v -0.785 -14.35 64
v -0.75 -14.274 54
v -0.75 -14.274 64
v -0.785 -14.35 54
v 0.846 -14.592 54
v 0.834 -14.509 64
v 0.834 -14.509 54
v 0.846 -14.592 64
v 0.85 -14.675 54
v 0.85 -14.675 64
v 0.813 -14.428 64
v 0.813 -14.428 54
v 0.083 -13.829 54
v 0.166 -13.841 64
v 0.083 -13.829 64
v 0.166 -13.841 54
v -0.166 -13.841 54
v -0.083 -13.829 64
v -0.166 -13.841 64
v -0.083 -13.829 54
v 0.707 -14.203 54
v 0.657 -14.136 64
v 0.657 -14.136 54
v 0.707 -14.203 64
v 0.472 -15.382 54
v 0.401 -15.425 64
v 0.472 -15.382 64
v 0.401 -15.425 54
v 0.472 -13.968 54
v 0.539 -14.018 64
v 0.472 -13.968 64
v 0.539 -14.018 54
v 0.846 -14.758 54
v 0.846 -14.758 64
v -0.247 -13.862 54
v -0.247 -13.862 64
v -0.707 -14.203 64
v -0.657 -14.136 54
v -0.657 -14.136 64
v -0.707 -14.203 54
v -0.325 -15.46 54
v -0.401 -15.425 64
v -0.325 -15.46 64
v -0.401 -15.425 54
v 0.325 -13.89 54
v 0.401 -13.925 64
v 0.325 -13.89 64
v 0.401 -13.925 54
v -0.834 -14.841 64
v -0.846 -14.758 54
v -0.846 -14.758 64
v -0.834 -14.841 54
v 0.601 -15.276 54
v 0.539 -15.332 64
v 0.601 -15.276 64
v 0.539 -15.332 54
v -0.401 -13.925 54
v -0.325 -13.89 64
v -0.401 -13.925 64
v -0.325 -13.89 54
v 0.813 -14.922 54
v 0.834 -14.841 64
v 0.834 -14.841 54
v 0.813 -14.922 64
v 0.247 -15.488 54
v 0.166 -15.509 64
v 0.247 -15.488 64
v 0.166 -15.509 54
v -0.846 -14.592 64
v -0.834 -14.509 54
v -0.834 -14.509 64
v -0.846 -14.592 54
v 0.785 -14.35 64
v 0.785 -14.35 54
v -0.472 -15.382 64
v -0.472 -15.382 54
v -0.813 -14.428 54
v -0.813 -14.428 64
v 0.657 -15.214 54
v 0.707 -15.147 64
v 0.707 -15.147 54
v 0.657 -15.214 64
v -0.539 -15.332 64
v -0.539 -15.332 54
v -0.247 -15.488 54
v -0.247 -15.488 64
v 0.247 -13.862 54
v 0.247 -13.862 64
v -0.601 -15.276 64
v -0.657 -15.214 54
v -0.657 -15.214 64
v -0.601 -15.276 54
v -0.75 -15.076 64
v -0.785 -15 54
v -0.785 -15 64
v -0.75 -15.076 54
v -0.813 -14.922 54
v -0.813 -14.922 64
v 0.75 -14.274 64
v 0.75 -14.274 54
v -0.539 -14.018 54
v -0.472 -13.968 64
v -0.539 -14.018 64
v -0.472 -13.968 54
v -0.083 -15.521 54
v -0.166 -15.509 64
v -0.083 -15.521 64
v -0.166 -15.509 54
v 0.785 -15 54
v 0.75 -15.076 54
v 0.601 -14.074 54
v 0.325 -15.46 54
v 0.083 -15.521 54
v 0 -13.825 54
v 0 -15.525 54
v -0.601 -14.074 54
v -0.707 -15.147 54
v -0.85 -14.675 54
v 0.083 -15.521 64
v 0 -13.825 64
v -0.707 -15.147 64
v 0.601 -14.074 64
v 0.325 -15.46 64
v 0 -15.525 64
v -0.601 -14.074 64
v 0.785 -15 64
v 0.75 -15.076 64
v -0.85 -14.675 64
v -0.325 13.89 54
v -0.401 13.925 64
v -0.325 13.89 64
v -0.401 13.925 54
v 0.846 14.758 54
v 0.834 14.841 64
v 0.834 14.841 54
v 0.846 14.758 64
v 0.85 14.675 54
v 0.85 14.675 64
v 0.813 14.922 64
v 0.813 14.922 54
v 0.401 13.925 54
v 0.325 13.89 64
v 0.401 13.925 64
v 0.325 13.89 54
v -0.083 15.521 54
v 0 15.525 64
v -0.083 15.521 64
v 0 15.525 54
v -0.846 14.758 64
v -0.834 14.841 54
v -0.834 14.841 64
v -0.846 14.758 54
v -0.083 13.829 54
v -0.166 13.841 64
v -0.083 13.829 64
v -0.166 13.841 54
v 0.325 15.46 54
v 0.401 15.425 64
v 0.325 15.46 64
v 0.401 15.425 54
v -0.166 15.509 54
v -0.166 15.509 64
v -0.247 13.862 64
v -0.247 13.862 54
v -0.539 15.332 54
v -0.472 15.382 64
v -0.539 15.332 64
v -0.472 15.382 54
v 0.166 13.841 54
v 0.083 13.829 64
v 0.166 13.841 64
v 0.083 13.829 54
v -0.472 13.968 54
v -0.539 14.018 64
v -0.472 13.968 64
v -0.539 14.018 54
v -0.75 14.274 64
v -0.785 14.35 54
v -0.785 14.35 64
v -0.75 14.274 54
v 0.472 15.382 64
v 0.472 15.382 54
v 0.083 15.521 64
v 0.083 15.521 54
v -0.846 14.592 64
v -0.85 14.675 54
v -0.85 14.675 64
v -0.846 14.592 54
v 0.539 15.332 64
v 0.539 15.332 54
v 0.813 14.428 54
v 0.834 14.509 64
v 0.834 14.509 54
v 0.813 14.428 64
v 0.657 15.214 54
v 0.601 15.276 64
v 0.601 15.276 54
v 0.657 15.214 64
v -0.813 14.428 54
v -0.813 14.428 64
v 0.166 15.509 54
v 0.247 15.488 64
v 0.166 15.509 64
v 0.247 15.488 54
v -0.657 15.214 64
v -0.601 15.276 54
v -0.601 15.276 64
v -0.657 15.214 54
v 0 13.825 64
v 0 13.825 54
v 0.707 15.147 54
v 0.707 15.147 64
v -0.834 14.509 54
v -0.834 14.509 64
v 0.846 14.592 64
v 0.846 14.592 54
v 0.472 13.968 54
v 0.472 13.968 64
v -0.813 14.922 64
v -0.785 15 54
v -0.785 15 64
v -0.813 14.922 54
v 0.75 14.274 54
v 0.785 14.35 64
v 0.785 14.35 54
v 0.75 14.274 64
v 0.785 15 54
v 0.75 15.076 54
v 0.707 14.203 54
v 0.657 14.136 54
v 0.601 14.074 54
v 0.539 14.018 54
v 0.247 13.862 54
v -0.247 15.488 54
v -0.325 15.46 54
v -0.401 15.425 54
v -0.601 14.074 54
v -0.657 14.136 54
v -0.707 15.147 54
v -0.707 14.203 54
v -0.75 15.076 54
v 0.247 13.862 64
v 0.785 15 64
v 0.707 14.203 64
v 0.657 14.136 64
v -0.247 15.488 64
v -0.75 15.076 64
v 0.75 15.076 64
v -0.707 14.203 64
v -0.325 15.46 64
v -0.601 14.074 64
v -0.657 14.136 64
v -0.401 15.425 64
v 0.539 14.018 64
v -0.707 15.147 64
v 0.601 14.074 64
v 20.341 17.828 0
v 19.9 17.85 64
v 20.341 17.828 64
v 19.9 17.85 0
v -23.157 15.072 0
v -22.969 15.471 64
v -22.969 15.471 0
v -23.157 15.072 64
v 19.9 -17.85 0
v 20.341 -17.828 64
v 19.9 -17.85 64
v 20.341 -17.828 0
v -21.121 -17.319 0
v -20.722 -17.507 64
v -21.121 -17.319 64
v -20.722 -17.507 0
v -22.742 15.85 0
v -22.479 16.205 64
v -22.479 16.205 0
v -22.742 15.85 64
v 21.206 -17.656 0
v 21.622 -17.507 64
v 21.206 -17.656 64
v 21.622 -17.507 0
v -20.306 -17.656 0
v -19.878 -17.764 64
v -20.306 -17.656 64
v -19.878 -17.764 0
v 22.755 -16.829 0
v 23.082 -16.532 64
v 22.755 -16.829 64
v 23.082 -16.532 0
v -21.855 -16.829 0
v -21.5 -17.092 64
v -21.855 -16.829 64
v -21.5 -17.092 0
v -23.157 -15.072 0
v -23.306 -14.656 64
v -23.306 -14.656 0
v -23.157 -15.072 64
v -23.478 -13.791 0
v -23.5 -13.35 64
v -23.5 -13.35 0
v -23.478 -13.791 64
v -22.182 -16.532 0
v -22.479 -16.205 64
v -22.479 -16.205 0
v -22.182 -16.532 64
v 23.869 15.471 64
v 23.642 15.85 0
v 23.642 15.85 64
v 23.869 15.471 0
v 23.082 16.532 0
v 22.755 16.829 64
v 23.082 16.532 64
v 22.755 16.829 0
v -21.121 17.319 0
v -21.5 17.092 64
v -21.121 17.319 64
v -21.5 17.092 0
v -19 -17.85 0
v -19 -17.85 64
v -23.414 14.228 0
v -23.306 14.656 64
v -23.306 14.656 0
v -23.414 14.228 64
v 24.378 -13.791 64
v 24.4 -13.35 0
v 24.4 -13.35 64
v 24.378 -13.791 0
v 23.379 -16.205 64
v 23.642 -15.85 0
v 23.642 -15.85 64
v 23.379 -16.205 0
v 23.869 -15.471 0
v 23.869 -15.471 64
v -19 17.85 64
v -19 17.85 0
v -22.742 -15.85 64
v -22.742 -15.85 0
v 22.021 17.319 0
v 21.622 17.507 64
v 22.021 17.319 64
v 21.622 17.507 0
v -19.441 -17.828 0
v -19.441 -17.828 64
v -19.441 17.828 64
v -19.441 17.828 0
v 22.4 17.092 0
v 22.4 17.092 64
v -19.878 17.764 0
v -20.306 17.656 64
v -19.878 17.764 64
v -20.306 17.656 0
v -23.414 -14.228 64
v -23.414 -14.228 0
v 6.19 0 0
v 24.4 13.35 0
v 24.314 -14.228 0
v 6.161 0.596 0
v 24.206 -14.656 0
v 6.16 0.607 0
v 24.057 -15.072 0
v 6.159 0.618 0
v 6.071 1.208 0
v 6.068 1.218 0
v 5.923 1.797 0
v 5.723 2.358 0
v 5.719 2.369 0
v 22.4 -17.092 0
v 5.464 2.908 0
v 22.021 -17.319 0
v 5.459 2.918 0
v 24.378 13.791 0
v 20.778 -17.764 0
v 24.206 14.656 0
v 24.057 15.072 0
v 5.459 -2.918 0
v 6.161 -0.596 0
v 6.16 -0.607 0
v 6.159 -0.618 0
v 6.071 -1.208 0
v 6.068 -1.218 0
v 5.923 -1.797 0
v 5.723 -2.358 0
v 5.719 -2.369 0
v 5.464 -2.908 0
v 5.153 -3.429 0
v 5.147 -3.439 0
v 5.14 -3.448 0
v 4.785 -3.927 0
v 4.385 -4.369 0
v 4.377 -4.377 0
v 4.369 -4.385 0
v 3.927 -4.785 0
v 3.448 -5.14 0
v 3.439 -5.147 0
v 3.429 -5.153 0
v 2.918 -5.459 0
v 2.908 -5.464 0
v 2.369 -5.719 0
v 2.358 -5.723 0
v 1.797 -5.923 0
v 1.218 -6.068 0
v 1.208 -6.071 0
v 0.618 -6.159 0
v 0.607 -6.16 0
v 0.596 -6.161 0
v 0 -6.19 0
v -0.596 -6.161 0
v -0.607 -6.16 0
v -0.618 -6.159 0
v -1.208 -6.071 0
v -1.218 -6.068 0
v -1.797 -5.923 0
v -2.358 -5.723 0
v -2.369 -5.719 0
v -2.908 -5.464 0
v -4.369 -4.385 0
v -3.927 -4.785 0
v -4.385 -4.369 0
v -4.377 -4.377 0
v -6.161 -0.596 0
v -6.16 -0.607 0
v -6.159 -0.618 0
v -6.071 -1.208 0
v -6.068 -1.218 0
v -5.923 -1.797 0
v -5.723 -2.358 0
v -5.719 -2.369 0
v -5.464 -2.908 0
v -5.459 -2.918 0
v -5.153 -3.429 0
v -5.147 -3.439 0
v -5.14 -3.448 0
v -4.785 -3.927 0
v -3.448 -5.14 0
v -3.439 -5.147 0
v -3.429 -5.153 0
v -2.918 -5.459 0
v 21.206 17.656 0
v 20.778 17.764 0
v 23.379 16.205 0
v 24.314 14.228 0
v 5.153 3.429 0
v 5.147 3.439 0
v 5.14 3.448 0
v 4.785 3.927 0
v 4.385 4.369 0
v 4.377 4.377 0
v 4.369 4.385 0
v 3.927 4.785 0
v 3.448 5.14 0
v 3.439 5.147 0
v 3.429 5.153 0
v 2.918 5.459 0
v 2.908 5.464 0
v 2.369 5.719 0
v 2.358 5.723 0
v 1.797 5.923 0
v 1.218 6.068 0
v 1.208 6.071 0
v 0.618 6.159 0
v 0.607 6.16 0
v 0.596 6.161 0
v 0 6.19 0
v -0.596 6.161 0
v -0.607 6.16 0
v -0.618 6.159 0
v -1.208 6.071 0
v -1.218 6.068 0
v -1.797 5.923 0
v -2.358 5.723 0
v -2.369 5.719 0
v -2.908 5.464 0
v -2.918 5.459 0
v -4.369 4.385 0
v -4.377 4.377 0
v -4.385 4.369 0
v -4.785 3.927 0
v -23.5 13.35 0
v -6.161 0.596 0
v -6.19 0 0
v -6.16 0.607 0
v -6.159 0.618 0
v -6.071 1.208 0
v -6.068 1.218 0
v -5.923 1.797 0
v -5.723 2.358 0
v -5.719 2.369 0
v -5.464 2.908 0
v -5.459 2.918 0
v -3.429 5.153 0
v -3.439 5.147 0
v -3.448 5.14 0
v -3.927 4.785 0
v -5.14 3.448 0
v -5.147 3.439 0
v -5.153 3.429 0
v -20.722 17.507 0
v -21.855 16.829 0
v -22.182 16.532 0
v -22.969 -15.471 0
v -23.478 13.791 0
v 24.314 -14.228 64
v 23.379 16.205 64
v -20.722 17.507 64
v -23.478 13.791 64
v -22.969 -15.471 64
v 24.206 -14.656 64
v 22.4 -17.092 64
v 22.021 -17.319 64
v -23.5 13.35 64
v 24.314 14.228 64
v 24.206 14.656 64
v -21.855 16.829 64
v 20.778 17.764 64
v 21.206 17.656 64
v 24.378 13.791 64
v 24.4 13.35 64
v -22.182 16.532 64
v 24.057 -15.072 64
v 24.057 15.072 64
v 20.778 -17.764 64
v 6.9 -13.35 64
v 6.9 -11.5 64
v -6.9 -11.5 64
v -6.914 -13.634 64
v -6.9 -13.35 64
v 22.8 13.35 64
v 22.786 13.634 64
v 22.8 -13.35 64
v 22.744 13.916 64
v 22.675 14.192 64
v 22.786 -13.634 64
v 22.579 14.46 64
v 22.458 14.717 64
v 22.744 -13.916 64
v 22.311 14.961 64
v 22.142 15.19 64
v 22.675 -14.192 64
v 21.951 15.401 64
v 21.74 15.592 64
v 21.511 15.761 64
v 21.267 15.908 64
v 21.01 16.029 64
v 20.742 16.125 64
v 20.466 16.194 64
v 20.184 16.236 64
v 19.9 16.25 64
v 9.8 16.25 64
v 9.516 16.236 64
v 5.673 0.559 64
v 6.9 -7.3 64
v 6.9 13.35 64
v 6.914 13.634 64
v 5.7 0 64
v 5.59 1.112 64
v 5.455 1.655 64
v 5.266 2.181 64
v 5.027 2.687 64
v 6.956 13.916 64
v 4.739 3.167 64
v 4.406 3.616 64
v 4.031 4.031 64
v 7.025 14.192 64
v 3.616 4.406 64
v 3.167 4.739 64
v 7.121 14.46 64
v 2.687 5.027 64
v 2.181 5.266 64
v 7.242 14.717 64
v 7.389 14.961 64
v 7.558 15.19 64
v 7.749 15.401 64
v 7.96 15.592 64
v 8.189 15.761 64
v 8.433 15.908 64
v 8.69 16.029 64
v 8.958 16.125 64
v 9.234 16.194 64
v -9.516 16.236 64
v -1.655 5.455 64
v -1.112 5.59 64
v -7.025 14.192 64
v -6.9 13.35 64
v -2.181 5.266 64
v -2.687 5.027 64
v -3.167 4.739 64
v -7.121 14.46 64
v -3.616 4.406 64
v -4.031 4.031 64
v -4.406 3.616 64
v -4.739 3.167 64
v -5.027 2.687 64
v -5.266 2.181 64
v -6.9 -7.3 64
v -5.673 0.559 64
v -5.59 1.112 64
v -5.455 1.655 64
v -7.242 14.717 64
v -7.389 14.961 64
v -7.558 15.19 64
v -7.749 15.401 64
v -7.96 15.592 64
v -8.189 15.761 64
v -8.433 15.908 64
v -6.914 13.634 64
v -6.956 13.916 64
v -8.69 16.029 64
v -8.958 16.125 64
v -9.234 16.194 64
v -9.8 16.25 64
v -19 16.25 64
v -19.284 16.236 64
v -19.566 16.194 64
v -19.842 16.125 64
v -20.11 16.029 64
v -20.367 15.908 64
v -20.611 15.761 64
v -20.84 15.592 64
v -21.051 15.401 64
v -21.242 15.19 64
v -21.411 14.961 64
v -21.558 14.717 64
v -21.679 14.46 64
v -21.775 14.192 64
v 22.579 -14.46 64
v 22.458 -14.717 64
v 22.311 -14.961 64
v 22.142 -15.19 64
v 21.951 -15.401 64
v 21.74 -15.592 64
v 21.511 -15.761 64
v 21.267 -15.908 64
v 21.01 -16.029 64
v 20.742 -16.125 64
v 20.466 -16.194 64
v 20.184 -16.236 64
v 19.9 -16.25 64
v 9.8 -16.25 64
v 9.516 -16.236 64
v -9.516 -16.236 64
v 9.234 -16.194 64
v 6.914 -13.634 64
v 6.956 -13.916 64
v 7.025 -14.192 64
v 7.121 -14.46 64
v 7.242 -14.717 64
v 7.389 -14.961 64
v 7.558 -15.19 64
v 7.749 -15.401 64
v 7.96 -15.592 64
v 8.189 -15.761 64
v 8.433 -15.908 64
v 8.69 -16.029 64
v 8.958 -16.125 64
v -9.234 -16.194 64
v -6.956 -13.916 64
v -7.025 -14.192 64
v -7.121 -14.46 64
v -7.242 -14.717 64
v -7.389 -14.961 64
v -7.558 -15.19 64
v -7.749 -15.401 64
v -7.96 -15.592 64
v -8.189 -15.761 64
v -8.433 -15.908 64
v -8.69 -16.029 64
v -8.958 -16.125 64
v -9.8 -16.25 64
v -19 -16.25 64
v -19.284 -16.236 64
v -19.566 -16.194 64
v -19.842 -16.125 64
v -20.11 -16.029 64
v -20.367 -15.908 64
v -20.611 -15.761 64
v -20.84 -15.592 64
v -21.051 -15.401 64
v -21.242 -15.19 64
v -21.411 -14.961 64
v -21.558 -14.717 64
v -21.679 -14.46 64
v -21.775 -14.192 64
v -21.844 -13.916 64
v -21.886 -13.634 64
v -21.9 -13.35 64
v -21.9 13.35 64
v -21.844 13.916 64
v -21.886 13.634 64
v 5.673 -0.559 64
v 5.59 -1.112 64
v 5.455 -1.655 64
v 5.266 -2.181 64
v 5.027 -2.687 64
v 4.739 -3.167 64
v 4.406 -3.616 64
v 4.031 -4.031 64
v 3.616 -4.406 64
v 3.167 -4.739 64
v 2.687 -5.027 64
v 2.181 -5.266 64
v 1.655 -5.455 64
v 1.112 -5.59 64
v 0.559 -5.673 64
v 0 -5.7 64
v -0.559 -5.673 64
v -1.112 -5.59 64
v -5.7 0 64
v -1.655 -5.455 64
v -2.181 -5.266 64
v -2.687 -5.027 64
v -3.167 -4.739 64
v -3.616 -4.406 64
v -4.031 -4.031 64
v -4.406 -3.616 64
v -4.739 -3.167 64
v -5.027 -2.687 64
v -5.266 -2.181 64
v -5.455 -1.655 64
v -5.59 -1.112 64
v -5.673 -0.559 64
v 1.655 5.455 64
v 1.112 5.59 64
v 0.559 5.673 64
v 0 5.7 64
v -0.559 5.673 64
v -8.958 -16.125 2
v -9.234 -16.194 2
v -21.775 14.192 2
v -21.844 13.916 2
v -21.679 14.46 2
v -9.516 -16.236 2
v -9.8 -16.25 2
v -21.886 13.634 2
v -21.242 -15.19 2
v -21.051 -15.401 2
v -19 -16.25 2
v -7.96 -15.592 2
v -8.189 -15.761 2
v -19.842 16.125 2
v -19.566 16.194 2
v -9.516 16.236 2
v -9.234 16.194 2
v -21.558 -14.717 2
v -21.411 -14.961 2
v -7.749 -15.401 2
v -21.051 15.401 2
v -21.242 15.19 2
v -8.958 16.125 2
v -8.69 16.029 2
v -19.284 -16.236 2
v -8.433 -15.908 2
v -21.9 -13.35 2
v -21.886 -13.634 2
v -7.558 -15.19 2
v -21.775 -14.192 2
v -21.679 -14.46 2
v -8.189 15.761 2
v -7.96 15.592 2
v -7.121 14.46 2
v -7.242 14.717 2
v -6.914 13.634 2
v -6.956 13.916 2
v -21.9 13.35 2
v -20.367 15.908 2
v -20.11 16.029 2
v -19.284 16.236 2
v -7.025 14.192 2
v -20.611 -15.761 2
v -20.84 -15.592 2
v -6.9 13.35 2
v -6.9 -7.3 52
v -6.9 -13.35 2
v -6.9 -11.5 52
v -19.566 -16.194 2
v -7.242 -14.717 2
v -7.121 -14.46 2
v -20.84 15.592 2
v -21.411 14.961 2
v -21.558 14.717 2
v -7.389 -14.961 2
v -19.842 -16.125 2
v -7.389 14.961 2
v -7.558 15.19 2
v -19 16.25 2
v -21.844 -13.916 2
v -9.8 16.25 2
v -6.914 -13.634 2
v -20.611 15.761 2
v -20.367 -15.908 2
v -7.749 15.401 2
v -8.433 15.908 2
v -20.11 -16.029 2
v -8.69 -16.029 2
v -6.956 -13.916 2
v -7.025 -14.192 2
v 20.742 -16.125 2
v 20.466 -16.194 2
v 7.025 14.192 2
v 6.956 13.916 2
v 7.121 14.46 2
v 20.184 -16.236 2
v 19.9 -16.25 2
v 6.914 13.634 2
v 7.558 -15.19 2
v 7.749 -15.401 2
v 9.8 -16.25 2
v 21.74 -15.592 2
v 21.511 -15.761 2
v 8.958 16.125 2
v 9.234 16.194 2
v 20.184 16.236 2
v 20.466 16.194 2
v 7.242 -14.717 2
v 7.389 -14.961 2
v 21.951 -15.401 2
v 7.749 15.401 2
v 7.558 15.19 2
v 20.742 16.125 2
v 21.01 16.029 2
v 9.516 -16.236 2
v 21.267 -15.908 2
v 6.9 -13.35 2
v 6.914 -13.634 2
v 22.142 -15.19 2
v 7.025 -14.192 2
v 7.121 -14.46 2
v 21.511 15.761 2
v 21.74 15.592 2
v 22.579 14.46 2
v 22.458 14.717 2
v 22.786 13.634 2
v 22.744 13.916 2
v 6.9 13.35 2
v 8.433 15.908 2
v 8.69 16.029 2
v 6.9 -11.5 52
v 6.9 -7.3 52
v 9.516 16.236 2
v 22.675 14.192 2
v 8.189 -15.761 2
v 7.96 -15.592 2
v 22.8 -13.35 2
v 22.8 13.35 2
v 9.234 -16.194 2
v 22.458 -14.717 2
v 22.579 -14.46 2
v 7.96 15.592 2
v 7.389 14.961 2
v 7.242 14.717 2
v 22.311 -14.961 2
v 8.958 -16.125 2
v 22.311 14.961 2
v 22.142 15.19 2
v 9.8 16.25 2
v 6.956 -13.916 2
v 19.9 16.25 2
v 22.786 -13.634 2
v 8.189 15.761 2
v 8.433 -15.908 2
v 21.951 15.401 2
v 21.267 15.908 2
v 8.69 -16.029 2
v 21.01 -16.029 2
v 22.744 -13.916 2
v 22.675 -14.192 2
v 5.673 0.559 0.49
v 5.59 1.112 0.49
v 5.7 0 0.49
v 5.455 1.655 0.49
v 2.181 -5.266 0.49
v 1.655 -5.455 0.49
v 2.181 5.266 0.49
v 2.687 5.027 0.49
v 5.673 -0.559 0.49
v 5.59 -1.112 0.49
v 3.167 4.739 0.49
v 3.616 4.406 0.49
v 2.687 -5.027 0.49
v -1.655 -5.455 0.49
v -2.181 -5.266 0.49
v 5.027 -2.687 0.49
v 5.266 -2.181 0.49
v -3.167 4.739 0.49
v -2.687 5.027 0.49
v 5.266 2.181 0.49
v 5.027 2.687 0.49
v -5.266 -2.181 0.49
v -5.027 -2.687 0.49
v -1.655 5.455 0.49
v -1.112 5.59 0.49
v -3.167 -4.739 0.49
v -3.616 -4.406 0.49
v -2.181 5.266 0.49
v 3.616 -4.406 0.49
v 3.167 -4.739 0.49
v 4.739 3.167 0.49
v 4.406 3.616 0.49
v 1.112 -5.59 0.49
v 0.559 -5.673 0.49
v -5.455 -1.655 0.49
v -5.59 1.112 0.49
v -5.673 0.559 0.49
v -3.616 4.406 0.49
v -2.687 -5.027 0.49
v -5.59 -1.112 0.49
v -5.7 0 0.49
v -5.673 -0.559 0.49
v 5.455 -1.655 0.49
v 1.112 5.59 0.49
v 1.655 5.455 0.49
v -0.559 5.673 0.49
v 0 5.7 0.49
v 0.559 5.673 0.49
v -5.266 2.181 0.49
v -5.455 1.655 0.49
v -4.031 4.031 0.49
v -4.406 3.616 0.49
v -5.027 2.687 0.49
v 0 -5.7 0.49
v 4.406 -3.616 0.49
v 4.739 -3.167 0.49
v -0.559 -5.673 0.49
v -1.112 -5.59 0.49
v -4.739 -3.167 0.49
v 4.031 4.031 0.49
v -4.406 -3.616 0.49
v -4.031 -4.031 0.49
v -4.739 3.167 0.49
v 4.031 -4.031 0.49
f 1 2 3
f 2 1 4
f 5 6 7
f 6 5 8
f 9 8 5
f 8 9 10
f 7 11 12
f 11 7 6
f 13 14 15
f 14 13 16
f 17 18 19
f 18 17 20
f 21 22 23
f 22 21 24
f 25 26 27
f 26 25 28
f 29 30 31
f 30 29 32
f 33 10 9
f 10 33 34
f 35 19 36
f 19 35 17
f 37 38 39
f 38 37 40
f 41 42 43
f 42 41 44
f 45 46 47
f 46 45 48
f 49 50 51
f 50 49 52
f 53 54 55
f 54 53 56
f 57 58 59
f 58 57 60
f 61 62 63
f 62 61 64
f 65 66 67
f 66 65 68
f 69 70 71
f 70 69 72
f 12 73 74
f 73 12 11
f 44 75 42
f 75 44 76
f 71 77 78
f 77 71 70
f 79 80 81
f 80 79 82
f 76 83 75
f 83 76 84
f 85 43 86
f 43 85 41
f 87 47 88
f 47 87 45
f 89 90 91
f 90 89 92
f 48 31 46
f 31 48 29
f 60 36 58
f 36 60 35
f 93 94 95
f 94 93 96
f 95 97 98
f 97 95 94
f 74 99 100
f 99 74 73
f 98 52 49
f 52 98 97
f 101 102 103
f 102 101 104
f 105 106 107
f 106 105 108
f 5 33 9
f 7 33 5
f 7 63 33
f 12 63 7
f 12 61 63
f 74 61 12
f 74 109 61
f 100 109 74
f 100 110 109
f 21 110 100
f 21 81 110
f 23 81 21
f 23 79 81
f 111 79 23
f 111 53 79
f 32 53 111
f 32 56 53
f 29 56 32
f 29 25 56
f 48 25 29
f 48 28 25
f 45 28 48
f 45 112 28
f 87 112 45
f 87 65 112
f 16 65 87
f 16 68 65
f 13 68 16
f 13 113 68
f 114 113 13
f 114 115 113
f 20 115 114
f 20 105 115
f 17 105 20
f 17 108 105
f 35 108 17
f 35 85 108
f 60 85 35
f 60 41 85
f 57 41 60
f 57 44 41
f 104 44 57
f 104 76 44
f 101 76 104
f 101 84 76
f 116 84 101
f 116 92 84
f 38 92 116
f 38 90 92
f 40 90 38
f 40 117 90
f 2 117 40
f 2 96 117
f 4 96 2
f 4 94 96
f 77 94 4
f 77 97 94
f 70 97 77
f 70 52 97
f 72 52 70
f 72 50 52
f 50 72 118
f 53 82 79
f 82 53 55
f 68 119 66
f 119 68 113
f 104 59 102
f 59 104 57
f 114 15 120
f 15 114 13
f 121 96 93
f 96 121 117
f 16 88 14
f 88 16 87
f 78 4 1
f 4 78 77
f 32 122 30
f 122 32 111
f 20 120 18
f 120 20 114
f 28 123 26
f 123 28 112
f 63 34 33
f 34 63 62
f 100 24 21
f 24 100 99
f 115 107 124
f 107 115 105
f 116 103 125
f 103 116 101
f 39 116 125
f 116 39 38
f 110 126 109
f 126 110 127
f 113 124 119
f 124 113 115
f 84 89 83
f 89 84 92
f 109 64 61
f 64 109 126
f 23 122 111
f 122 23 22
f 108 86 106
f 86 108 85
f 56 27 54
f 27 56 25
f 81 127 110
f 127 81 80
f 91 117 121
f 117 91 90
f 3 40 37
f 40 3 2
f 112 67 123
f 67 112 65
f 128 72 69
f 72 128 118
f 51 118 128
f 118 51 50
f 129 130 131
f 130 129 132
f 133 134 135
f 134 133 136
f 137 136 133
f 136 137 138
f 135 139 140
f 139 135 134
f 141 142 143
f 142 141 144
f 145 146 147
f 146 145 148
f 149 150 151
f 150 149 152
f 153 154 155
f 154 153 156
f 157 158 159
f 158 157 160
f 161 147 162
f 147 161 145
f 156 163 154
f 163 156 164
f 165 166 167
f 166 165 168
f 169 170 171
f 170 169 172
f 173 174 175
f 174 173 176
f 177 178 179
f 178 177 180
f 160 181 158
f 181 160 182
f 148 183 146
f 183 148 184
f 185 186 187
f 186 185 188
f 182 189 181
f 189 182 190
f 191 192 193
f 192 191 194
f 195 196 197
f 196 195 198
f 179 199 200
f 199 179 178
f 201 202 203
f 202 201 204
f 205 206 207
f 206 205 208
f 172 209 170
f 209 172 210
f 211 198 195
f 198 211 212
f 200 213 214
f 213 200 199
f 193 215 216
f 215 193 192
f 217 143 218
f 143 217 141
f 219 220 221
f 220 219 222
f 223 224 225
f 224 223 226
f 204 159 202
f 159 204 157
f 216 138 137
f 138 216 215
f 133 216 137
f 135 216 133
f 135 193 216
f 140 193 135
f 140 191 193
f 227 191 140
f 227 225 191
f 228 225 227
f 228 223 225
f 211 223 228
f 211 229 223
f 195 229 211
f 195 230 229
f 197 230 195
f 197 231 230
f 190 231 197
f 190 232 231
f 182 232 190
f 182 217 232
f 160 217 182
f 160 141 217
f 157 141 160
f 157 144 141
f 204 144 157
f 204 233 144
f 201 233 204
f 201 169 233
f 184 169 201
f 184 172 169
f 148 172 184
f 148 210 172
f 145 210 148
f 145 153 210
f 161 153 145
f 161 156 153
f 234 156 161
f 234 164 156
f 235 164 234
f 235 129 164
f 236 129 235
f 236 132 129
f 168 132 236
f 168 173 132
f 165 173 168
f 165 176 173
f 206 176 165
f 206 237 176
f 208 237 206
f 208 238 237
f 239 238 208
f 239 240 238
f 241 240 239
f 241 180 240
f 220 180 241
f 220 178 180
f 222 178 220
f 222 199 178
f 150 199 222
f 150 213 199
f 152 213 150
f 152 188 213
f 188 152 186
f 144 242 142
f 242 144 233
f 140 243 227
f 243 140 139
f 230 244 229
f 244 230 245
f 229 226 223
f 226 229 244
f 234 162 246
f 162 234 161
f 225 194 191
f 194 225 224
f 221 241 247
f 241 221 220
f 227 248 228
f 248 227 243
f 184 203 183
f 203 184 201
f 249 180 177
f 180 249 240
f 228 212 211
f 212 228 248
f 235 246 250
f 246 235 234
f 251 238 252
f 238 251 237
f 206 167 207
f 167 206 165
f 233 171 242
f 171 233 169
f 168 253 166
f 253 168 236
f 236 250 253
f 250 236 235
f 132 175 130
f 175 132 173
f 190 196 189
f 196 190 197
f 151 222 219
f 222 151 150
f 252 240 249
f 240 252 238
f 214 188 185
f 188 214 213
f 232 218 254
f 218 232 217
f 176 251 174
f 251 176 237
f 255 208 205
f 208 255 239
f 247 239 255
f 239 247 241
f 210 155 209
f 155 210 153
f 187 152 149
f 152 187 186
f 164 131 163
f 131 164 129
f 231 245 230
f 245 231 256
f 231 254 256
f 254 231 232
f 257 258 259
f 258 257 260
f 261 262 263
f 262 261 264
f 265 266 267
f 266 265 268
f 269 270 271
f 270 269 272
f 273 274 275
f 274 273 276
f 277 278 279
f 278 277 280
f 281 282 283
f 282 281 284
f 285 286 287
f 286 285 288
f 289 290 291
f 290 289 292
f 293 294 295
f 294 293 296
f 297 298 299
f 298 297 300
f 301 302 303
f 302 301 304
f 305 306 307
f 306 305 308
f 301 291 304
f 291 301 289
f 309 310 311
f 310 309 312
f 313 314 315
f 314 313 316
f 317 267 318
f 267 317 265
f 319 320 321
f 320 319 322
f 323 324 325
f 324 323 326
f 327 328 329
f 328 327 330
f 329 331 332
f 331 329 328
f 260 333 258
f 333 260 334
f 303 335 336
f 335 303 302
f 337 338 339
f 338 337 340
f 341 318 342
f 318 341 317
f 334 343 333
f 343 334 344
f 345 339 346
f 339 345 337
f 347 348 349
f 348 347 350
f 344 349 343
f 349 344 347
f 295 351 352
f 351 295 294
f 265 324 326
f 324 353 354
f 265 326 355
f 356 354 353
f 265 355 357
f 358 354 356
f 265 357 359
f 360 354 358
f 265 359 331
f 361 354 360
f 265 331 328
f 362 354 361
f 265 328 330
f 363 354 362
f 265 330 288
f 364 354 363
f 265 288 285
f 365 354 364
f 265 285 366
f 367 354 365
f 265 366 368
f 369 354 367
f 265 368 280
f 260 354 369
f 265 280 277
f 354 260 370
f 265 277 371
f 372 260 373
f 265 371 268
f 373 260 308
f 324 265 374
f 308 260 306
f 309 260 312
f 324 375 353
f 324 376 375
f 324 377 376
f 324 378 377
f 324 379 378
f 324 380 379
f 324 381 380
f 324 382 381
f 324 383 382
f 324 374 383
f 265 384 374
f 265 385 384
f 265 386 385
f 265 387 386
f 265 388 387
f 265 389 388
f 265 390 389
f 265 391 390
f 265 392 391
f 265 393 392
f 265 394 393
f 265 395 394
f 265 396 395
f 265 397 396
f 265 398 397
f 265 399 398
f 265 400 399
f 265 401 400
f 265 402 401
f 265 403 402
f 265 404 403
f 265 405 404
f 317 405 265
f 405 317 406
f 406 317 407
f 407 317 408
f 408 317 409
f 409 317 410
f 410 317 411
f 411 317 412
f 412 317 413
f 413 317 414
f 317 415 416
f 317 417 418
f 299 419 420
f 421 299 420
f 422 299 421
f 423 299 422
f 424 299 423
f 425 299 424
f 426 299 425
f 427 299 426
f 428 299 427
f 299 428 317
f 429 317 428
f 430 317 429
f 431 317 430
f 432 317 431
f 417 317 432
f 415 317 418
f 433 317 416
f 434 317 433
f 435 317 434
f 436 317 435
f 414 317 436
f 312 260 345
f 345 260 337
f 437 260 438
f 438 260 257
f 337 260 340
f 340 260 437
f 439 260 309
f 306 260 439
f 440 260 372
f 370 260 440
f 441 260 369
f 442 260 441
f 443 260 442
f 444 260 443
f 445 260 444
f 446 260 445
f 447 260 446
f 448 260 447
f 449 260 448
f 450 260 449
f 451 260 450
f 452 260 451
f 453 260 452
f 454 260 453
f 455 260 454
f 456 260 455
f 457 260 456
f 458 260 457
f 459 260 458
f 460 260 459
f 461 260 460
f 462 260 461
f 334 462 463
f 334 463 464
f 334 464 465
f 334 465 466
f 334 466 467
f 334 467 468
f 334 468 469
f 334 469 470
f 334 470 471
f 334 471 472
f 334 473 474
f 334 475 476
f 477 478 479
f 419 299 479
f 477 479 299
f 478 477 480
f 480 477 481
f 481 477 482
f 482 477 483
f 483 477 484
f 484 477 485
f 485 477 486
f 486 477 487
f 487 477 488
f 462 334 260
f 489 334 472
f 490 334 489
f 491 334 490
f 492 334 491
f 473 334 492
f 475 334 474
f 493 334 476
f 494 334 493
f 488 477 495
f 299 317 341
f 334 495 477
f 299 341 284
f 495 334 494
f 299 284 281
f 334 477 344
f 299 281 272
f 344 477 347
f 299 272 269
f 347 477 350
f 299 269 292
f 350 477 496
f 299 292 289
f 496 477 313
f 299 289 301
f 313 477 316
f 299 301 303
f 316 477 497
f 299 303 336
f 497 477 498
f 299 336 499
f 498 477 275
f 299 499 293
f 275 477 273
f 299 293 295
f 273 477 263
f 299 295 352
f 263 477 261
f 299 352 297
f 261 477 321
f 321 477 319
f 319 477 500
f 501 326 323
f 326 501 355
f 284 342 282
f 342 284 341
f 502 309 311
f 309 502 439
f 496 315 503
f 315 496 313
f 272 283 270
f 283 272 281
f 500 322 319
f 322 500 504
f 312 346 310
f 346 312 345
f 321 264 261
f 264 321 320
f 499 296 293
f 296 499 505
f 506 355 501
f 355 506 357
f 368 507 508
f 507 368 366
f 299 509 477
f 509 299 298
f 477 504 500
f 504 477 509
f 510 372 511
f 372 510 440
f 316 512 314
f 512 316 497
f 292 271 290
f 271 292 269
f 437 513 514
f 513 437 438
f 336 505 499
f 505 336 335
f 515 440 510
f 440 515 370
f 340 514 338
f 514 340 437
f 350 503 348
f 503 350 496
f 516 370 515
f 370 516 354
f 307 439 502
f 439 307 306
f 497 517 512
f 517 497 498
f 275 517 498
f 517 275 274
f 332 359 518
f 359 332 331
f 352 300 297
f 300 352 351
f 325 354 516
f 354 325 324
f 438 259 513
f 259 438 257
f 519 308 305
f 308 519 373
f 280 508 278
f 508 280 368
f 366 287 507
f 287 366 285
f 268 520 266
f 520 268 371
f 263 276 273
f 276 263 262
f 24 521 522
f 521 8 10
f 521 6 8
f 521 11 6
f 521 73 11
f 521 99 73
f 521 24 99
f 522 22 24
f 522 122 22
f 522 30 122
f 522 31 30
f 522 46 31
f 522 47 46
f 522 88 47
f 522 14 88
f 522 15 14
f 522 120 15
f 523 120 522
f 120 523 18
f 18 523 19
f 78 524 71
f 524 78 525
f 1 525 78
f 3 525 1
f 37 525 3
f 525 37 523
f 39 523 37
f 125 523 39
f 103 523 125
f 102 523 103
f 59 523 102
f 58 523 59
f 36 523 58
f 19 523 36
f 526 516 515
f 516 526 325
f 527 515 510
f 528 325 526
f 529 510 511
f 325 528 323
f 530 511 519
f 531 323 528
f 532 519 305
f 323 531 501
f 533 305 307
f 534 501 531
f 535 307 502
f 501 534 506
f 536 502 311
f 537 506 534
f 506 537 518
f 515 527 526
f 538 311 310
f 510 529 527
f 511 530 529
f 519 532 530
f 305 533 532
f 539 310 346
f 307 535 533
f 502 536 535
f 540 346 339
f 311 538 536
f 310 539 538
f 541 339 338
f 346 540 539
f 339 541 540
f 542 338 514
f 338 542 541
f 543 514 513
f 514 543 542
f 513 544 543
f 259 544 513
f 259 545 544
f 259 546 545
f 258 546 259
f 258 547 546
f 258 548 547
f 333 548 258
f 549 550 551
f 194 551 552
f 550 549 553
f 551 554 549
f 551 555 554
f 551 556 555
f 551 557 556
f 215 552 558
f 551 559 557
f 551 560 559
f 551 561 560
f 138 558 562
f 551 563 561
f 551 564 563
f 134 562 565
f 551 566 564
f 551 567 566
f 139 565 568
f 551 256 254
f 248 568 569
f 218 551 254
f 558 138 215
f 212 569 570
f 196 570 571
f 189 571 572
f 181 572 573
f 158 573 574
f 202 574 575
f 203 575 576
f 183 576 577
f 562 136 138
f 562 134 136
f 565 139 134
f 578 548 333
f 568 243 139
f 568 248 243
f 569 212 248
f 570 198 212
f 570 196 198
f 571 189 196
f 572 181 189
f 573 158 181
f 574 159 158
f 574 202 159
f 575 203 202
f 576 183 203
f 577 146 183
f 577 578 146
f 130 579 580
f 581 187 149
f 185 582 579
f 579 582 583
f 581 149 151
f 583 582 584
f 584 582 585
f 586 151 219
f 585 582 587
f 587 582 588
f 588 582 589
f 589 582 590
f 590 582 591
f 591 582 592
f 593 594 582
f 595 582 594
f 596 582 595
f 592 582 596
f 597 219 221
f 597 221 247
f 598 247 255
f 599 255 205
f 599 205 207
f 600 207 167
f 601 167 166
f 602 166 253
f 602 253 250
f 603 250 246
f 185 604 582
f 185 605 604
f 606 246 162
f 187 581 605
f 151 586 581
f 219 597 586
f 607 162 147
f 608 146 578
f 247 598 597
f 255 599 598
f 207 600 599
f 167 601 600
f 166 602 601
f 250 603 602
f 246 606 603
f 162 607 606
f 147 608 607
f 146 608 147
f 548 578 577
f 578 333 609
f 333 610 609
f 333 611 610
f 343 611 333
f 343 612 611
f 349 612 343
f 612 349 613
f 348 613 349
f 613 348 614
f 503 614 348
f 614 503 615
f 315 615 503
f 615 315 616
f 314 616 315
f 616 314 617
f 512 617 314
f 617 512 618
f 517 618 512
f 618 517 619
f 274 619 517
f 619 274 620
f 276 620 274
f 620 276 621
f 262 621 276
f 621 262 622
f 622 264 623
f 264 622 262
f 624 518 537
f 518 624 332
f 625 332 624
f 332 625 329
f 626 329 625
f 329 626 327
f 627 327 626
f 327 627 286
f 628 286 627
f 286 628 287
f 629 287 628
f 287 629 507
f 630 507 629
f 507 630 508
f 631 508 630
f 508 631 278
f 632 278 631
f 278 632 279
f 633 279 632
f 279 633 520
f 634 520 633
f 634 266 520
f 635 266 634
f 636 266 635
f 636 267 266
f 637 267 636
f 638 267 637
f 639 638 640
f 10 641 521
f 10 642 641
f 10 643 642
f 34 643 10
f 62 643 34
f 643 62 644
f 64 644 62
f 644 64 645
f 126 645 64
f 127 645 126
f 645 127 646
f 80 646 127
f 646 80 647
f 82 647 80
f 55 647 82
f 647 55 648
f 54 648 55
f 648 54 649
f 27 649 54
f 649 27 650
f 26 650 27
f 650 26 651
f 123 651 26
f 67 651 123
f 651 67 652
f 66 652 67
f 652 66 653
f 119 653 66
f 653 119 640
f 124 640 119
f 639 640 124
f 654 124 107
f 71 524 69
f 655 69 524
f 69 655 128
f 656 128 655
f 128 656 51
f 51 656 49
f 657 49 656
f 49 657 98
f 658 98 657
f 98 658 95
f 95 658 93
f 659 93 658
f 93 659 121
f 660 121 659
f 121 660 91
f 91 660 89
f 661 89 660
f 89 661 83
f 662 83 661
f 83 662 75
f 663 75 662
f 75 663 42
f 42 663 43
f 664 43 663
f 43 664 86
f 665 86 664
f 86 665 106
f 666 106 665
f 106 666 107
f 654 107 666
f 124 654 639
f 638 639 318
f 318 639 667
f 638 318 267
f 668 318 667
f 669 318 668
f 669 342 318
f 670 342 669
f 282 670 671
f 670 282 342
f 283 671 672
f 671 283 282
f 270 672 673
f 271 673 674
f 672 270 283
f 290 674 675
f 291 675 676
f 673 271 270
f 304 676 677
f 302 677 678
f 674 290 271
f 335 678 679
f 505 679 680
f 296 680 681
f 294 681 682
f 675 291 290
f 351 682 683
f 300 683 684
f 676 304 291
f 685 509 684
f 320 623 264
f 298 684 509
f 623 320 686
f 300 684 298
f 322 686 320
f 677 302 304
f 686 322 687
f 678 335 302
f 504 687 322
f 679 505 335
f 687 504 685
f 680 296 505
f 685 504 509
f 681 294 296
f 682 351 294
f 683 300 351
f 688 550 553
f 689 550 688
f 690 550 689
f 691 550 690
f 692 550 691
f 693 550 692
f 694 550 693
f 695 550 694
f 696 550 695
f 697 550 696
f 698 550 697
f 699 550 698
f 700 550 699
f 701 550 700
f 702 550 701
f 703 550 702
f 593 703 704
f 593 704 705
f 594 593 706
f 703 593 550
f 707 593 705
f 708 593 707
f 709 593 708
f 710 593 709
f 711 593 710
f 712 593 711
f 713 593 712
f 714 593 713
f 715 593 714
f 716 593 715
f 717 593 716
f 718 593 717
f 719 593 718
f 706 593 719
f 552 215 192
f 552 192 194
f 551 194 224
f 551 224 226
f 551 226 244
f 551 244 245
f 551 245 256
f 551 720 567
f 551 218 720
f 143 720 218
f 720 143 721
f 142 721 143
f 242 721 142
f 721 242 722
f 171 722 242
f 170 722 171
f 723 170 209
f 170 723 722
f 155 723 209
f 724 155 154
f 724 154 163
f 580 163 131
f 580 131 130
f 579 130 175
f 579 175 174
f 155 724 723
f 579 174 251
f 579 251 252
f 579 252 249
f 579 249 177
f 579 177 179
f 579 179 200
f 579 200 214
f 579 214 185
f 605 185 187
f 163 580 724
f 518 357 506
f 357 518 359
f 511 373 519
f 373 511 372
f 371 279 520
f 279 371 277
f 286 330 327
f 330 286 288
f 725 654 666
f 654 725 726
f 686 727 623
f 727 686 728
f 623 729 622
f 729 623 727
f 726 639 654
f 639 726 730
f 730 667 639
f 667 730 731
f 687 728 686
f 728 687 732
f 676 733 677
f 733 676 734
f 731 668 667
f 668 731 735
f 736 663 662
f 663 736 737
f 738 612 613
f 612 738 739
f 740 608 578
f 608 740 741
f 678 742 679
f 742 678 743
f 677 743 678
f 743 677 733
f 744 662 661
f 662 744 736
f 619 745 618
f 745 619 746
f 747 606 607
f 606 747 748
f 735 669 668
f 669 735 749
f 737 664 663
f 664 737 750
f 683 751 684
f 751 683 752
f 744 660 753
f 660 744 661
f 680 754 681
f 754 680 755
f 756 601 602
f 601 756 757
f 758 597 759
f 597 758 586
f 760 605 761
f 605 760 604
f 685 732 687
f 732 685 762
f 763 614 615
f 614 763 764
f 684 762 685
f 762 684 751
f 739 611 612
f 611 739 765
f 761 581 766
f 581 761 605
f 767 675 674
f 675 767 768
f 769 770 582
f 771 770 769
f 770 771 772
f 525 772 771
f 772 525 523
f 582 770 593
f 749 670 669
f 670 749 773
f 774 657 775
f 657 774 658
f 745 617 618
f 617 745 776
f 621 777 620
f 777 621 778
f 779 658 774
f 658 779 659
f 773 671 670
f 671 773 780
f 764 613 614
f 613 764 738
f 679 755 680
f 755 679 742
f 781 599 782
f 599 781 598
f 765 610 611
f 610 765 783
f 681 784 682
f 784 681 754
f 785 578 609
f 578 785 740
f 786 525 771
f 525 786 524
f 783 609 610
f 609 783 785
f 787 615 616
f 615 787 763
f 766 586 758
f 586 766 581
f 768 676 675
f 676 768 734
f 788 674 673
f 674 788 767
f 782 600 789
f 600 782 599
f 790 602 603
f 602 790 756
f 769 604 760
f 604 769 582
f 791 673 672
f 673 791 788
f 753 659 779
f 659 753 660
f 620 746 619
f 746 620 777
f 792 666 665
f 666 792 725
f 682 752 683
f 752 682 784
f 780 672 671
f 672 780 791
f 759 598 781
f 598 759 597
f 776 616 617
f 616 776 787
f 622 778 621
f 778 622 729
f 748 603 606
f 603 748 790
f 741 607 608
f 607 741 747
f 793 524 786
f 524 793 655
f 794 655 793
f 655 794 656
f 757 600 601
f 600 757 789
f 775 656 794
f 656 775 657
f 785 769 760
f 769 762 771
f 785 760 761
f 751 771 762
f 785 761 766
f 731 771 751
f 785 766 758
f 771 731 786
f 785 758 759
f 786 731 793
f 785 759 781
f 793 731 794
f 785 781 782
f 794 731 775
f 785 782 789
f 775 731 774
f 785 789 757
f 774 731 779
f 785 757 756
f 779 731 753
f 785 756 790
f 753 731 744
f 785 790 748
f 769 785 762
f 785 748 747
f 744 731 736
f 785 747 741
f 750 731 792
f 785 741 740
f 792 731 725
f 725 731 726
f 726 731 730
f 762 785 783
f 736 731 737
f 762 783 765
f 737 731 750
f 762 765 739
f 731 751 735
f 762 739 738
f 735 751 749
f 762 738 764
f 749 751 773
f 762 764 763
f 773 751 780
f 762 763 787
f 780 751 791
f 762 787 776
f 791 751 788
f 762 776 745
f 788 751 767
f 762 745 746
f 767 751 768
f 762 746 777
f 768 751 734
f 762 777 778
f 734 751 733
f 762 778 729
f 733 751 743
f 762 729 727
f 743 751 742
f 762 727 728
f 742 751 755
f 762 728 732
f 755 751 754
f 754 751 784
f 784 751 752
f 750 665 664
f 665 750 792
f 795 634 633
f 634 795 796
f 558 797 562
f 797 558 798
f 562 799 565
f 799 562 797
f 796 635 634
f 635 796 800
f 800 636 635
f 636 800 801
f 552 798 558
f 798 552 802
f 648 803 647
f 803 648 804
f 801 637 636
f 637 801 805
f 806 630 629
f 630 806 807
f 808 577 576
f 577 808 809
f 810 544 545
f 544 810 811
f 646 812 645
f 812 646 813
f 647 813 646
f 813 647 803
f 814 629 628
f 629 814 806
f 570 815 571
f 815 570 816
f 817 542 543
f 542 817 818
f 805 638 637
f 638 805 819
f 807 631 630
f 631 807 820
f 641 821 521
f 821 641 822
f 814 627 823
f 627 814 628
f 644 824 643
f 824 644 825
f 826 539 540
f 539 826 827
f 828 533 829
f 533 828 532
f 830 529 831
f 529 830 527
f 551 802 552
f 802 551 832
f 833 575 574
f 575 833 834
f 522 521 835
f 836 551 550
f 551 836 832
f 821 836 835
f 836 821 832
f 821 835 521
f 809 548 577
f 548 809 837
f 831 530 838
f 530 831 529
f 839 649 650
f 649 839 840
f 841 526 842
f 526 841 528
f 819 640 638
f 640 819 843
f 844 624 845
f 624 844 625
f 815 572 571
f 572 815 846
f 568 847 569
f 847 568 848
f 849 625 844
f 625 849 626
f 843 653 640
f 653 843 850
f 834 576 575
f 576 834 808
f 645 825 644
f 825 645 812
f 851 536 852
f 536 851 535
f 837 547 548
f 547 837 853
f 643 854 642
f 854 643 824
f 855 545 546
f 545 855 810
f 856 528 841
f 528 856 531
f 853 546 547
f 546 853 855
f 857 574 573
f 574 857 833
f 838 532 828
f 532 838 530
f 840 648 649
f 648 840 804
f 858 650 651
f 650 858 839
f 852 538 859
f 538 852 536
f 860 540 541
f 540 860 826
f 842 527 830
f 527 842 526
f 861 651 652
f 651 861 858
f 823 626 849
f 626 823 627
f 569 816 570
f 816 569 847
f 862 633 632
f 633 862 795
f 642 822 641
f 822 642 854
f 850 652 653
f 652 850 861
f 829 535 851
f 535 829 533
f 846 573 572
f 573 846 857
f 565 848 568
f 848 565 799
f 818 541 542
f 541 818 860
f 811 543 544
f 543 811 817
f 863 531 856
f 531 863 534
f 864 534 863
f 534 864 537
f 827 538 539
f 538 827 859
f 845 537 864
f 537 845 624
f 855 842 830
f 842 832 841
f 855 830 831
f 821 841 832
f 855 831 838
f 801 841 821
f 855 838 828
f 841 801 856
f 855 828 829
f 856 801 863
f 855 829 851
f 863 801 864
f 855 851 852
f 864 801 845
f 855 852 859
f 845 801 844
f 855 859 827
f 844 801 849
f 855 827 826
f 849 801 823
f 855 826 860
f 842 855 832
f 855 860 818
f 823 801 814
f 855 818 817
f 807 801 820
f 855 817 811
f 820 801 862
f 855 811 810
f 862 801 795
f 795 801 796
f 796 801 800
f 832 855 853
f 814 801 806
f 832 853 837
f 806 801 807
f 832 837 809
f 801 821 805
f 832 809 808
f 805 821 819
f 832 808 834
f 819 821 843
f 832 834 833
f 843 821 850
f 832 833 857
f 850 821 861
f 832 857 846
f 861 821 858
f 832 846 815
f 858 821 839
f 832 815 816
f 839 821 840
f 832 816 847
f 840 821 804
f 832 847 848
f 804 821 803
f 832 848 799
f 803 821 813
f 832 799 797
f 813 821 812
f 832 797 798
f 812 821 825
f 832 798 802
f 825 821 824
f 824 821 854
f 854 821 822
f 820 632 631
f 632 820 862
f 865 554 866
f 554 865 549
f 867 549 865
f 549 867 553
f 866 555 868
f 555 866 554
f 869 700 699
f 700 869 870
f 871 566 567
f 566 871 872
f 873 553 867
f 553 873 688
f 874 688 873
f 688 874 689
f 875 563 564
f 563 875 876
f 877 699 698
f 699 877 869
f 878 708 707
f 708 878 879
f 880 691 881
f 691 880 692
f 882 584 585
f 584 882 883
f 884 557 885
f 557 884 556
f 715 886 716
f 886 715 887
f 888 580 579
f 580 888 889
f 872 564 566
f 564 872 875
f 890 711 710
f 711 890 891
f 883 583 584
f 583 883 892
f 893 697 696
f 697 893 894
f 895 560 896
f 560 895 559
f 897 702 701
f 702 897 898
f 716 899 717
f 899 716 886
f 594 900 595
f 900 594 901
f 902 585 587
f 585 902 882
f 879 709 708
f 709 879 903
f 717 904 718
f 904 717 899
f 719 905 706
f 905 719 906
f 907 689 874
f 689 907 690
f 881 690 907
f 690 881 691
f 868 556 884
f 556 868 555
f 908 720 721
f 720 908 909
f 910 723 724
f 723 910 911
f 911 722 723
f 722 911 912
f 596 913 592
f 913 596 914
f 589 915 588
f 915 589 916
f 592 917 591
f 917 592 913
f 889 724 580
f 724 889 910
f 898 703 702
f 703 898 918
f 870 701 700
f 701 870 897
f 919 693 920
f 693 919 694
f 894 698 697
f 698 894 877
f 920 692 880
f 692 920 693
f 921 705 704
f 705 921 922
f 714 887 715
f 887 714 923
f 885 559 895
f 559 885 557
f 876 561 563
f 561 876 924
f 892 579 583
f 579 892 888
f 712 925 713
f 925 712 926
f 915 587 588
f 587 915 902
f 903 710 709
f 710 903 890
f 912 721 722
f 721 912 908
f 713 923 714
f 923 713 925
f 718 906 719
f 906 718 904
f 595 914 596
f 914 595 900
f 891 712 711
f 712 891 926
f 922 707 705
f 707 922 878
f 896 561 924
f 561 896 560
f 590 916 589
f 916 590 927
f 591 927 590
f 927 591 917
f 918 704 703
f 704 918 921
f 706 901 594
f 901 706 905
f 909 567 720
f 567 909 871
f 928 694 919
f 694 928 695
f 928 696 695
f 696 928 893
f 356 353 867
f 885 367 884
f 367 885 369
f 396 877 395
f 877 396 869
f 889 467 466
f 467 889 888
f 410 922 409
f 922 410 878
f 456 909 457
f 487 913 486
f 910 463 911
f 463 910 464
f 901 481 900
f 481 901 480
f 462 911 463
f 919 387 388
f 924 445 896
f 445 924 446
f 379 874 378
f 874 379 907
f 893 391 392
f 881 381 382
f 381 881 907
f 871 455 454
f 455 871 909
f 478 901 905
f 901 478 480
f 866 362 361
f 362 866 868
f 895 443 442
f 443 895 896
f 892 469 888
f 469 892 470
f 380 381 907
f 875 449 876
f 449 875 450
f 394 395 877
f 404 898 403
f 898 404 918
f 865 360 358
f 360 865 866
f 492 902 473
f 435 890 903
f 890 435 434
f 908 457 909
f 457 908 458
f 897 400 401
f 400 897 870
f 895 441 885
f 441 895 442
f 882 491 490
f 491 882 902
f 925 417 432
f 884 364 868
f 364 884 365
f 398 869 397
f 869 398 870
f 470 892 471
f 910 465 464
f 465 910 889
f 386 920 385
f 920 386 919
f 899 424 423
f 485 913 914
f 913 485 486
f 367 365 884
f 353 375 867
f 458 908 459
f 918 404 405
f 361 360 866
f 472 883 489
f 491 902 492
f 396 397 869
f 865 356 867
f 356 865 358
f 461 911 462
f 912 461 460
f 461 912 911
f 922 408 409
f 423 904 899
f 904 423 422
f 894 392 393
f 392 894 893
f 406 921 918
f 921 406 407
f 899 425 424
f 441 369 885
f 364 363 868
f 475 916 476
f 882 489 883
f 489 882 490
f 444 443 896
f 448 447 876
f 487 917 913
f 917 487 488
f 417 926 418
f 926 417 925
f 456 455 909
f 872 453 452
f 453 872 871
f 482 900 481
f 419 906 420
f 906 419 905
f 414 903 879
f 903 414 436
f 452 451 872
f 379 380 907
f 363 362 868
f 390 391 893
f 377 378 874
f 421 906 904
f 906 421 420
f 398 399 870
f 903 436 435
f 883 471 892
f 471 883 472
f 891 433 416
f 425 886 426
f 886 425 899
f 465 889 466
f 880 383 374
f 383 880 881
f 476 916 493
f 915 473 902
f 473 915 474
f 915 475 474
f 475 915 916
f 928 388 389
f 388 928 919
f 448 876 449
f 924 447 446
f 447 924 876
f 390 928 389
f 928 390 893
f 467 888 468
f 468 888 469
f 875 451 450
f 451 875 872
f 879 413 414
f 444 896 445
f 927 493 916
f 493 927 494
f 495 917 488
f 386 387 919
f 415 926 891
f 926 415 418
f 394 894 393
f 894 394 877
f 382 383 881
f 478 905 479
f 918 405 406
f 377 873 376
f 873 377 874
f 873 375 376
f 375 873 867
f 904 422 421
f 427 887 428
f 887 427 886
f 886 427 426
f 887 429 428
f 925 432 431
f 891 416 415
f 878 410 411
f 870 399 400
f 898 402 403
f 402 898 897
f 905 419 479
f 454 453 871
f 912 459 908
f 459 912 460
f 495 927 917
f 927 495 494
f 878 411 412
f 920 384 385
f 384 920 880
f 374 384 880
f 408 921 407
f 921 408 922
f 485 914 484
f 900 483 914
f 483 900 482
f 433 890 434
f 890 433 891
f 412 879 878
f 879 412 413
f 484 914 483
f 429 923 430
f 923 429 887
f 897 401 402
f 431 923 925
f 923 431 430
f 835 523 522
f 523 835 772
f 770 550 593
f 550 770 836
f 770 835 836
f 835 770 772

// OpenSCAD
// Tremor Cue Pen - POD v6 (saddlebags, roomy)
// Cross-section (looking down the pen):   [ section 1 ] ( pen ) [ section 2 ]
//   section 1 = NodeMCU + wires/foam + IMU + vibration module stack (13 x 30.5 x 59.3), standing on edge
//   section 2 = battery + TP4056 + switch (13.9 x 19.6 x 30.8), standing on edge (either way up)
// Both pockets slide in from the BACK; a closed back cap (USB slot per pocket + switch slot)
// holds them in with 2 x M2 self-tapping screws. A channel behind the pen joins the pockets for the
// battery-to-MCU wires (<= 36 mm).
// Print: base standing on its FRONT face (pen axis vertical), cap flat, as exported. Supports OFF.
// PLA, 0.2 mm layers, 3 walls, 15% infill, 4 mm brim on the base.

part = "base";   // "base", "cap", "plate", "view", "clash_parts"

// measured packs: [thickness (across the pen), height, length (along the pen)]
s1 = [13.0, 30.5, 59.3];
s2 = [13.9, 19.6, 30.8];          // battery pack lying lengthwise so the TP4056 USB faces the back cap
clr = 1.0;                         // per side: roomy, foam tape takes up the slack

hole_comp = 0.30;  bore_free = 0.30;  pen_d = 10.8;     // same bore that fit the Panda + rubber on v5
rb = (pen_d + hole_comp + bore_free) / 2;               // 5.7
tube = 1.2;  rt = rb + tube;                             // 6.9
wall = 1.6;  front_t = 2.0;  cap_t = 2.4;
pocket_h = max(s1[1], s2[1]) + 2*clr;                    // 32.8
pocket_L = s1[2] + 2*clr + 0.7;                          // 62
p1x = [-rt - s1[0] - 2*clr, -rt];                        // section 1 pocket, x
p2x = [rt, rt + s2[0] + 2*clr];                          // section 2 pocket, x
OX = [p1x[0] - wall, p2x[1] + wall];
OZ = [-pocket_h/2 - wall, pocket_h/2 + wall];
y_back = front_t + pocket_L;
// wire channel behind the pen, above it, joining the pockets (last 12 mm, open to the back)
ch_z = [rt + 0.4, rt + 4.6];  ch_L = 12;
screw_z = [ (ch_z[1] + OZ[1]) / 2, -(ch_z[1] + OZ[1]) / 2 ];
pilot = 1.7;  m2_clear = 2.4;  lip = 2.0;
fudge = 0.01;  $fn = 64;

assert(OZ[1] - ch_z[1] >= 4.5, "no room for the top screw above the wire channel");
assert(-2 + usb[1]/2 + 1.2 <= sw_z - sw_slot[1]/2, "USB and switch slots merge");
assert(s2[2] <= pocket_L && s2[1] <= pocket_L, "battery pack does not fit either way");

module box(xr, yr, zr) translate([xr[0], yr[0], zr[0]]) cube([xr[1]-xr[0], yr[1]-yr[0], zr[1]-zr[0]]);
module along_y(r, y0, y1) translate([0, y0, 0]) rotate([-90, 0, 0]) cylinder(r = r, h = y1 - y0);

r_out = 4.5;  r_pkt = r_out - wall;                    // rounded long edges; pockets follow with the same wall
usb = [11, 13];                                          // cap slot for a micro-USB plug, [across, tall]
sw_slot = [4.5, 9];  sw_z = pocket_h/2 - 1 - sw_slot[1]/2;   // switch handle slot, top of section 2
// rounded prism along y: 2D (x, -z) extruded from y0 to y1
module rbox(xr, yr, zr, r) translate([0, yr[0], 0]) rotate([-90, 0, 0]) linear_extrude(yr[1] - yr[0])
    translate([xr[0], -zr[1]]) offset(r = r) offset(delta = -r) square([xr[1] - xr[0], zr[1] - zr[0]]);
module rslot(xc, zc, sz, y0, y1) rbox([xc - sz[0]/2, xc + sz[0]/2], [y0, y1], [zc - sz[1]/2, zc + sz[1]/2], min(sz) / 2 - fudge);

module base() difference() {
    rbox(OX, [0, y_back], OZ, r_out);
    rbox(p1x, [front_t, y_back + 1], [-pocket_h/2, pocket_h/2], r_pkt);
    rbox(p2x, [front_t, y_back + 1], [-pocket_h/2, pocket_h/2], r_pkt);
    along_y(rb, -1, y_back + 1);                                                    // pen bore
    translate([0, -fudge, 0]) rotate([-90, 0, 0]) cylinder(r1 = rb + 0.5, r2 = rb, h = 0.5);   // elephant-foot lead-in
    box([p1x[1] - 1, p2x[0] + 1], [y_back - ch_L, y_back + 1], ch_z);              // wire channel
    for (z = screw_z) translate([0, y_back - 10, z]) rotate([-90, 0, 0]) cylinder(d = pilot, h = 11);
}

// closed cap: only a USB slot per pocket + the switch slot
module cap() difference() {
    rbox(OX, [0, cap_t], OZ, r_out);
    along_y(rb, -1, cap_t + 1);
    for (z = screw_z) translate([0, -1, z]) rotate([-90, 0, 0]) {
        cylinder(d = m2_clear, h = cap_t + 2);
        translate([0, 0, cap_t + 1 - 1.0]) cylinder(d1 = m2_clear, d2 = 4.4, h = 1.0 + fudge);   // countersink, outer face
    }
    rslot((p1x[0] + p1x[1]) / 2, 0, usb, -1, cap_t + 1);          // NodeMCU USB (center of section 1)
    rslot((p2x[0] + p2x[1]) / 2, -2, usb, -1, cap_t + 1);         // TP4056 USB (just below center of section 2)
    rslot((p2x[0] + p2x[1]) / 2, sw_z, sw_slot, -1, cap_t + 1);   // switch handle (top of section 2)
}

module dummies() {
    color("royalblue")  box([p1x[0] + clr, p1x[0] + clr + s1[0]], [front_t + clr, front_t + clr + s1[2]], [-s1[1]/2, s1[1]/2]);
    color("darkorange") box([p2x[0] + clr, p2x[0] + clr + s2[0]], [y_back - clr - s2[2], y_back - clr], [-s2[1]/2, s2[1]/2]);
}

module base_print() rotate([90, 0, 0]) base();   // front face on the bed, pen axis vertical
module cap_print()  rotate([90, 0, 0]) cap();    // inner face on the bed

if (part == "base")  base_print();
if (part == "cap")   cap_print();
if (part == "plate") { base_print(); translate([OX[1] - OX[0] + 8, 0, 0]) cap_print(); }
if (part == "view")  { color("seagreen") base(); dummies(); color("lightsteelblue", 0.5) translate([0, y_back + 0.3, 0]) cap();
                       color("gray", 0.4) along_y(pen_d/2, -40, y_back + 60); }
if (part == "clash_parts") intersection() { base(); dummies(); }
echo(str("Pod v6: ", OX[1] - OX[0], " W x ", OZ[1] - OZ[0], " H x ", y_back + cap_t, " L mm"));
